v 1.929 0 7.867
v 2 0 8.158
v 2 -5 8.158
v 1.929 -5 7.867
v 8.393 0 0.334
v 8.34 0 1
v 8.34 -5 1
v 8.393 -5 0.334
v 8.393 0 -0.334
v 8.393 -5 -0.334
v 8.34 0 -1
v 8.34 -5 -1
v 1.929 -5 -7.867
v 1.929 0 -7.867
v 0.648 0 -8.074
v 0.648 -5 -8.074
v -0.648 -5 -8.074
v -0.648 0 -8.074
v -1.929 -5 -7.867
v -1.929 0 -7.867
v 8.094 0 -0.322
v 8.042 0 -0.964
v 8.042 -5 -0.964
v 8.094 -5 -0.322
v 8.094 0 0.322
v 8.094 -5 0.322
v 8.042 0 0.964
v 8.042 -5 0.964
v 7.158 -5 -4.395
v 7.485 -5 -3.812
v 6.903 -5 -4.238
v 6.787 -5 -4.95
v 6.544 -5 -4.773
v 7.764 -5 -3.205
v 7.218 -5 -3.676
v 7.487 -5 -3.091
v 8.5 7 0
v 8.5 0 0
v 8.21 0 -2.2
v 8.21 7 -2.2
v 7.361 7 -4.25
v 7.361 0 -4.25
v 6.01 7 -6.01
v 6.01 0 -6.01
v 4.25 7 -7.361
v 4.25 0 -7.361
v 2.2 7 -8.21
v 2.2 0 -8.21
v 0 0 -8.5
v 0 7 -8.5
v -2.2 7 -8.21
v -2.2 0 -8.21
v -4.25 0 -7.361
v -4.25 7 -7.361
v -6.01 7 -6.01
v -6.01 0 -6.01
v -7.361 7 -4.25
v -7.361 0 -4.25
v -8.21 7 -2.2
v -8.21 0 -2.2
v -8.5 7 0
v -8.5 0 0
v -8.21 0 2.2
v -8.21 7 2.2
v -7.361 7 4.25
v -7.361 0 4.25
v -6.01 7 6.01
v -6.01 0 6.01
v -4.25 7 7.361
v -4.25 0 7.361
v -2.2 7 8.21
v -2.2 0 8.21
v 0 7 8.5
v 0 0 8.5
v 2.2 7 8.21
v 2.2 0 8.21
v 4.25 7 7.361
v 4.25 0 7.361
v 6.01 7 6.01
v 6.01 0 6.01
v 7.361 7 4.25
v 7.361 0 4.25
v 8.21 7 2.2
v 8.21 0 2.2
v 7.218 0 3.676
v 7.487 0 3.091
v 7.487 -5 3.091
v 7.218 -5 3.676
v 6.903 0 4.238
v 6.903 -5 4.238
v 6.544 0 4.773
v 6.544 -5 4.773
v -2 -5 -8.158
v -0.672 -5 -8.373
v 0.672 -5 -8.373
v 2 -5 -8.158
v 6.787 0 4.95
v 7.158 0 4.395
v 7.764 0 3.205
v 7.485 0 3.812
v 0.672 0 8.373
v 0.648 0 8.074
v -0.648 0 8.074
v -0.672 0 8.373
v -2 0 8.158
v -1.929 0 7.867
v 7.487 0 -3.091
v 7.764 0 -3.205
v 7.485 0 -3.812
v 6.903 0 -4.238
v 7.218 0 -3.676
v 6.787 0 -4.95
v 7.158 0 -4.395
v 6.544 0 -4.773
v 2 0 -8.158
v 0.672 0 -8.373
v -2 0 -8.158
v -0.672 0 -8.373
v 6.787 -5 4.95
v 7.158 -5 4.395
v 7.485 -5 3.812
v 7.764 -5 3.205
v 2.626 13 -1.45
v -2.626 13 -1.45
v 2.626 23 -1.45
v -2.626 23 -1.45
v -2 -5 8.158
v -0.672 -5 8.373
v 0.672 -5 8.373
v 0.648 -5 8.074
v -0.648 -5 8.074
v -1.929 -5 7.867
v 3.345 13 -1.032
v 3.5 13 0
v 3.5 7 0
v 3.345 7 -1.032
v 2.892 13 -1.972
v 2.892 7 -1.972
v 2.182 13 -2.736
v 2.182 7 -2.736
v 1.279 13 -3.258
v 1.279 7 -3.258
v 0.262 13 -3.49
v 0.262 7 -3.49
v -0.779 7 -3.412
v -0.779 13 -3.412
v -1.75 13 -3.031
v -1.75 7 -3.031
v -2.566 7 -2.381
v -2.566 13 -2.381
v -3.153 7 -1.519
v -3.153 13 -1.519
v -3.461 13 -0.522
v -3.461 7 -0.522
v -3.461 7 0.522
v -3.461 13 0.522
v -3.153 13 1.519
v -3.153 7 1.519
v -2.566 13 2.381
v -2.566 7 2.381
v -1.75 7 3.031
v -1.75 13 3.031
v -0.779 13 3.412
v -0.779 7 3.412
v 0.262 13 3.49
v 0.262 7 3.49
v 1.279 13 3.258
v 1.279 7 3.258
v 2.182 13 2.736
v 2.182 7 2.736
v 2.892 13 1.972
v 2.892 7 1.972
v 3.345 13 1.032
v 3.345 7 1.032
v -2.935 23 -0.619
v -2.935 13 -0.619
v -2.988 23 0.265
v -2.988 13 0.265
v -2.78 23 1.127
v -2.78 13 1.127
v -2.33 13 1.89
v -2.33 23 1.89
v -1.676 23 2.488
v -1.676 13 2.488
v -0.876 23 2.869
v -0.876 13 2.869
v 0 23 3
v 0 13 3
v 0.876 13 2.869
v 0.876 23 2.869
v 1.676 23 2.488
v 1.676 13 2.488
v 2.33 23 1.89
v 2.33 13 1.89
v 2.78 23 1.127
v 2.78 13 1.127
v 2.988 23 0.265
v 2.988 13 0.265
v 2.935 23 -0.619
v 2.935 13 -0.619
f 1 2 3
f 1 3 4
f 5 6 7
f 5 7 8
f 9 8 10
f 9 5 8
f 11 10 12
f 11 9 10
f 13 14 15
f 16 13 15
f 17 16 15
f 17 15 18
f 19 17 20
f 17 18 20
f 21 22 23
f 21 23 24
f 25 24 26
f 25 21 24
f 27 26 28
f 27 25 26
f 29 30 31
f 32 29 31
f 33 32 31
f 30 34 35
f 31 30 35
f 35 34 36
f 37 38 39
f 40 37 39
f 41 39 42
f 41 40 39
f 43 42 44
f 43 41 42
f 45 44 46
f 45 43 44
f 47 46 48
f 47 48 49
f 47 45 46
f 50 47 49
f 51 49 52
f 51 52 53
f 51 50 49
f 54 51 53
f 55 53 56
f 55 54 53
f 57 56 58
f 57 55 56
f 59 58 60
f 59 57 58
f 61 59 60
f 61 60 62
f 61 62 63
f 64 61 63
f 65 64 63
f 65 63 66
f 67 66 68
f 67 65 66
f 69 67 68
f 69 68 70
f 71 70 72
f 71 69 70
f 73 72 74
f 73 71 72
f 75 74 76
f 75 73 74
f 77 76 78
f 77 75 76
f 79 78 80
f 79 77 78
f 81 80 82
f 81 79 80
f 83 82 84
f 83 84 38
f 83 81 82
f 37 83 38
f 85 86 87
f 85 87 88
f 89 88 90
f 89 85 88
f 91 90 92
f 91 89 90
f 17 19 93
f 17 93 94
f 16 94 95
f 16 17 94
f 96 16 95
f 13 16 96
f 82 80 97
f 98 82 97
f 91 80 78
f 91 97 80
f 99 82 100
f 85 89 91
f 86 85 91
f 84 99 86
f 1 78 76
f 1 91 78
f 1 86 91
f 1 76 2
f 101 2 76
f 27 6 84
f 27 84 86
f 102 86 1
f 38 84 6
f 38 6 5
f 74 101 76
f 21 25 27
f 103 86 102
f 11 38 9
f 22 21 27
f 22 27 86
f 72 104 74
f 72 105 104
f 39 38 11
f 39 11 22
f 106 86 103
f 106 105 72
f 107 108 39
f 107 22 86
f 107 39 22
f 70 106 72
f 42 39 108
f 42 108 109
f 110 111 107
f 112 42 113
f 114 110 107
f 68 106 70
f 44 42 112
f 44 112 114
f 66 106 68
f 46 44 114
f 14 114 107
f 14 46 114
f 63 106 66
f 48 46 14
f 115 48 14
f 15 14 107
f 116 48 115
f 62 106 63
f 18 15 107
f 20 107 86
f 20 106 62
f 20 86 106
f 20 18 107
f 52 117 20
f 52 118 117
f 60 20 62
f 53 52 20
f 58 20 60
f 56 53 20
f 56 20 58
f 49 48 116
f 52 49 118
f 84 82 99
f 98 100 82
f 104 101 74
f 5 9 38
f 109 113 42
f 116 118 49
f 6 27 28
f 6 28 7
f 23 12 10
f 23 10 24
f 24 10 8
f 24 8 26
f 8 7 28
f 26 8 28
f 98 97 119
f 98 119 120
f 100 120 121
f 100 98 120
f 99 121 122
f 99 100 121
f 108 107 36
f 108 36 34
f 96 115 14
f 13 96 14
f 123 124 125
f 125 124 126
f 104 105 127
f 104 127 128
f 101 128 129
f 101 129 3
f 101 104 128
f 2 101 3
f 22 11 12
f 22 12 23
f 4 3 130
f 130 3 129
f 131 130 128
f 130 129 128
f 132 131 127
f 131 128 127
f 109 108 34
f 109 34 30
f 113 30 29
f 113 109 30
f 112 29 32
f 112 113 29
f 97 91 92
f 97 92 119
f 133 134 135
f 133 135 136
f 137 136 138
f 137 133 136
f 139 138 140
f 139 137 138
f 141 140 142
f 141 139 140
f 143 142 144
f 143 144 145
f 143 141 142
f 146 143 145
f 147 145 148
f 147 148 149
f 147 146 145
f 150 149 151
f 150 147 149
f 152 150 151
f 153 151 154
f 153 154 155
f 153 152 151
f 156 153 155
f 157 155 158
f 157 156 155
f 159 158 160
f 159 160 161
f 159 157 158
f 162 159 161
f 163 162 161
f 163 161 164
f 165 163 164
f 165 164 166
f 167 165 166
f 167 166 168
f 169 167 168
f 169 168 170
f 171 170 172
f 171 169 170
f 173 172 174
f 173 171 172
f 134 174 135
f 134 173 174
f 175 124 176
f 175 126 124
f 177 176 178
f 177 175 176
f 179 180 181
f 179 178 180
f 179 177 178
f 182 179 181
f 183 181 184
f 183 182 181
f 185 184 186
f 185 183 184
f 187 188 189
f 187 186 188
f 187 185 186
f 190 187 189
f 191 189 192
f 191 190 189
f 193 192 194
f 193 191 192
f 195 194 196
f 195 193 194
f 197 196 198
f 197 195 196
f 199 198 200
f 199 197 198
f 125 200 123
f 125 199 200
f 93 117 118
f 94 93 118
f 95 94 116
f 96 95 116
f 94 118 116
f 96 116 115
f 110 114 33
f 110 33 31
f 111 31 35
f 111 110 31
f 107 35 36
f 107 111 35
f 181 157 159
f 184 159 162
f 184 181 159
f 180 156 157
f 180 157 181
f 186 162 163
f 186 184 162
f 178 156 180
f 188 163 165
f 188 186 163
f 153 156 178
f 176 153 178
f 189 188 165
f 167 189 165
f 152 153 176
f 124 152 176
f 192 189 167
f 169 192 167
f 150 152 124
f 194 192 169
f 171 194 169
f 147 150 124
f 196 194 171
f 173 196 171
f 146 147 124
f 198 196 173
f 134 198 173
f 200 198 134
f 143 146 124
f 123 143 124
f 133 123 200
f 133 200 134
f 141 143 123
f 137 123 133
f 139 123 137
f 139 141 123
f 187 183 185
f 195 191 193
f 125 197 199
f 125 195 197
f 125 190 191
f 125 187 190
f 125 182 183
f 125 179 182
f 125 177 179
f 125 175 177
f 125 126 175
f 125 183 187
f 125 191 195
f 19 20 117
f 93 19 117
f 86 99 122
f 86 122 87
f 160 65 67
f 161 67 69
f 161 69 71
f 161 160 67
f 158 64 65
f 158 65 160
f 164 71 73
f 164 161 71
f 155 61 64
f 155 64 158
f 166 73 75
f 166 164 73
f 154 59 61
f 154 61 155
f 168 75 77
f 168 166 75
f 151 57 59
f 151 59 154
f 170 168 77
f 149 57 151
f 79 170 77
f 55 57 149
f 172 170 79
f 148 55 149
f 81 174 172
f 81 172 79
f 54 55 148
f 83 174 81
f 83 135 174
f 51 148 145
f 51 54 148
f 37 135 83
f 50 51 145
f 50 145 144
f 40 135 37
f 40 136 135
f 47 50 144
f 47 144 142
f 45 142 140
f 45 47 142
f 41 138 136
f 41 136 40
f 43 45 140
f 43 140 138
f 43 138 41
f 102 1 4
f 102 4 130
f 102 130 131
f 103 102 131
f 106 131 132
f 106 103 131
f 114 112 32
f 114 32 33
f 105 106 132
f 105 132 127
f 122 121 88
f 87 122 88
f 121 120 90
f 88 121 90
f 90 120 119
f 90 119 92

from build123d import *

# Parameters (mm, degrees)
BOSS_EXTRUDE1_DEPTH     = 5
CUT_EXTRUDE1_DEPTH      = 26.951878545
CUT_EXTRUDE1_DEPTH_BACK = 26.951878545
SKETCH4_W               = 1.55
SKETCH4_H               = 10


with BuildPart() as part:
    # Sketch2 → Revolve1 (revolve)
    with BuildSketch(Plane.XY):
        Polygon((0, 0), (8.5, 0), (8.5, 7), (3.5, 7), (3.5, 13), (3, 13), (3, 23), (0, 23), align=None)
    revolve(axis=Axis((0, -1000, 0), (0, 1, 0)))

    # Sketch3 → Boss-Extrude1 (add)
    with BuildSketch(Plane.XZ):
        with BuildLine():
            Line((6.544190201, 4.773214286), (6.786567616, 4.95))
            ThreePointArc((6.786567616, 4.95), (7.327590965, 4.106873586), (7.76439466, 3.205335485))
            Line((7.76439466, 3.205335485), (7.48709485, 3.090859217))
            ThreePointArc((7.48709485, 3.090859217), (7.065891288, 3.960199529), (6.544190201, 4.773214286))
        make_face()
        with BuildLine():
            Line((8.042397221, 0.964285714), (8.340263785, 1))
            ThreePointArc((8.340263785, 1), (8.4, 0), (8.340263785, -1))
            Line((8.340263785, -1), (8.042397221, -0.964285714))
            ThreePointArc((8.042397221, -0.964285714), (8.1, 0), (8.042397221, 0.964285714))
        make_face()
        with BuildLine():
            Line((7.48709485, -3.090859217), (7.76439466, -3.205335485))
            ThreePointArc((7.76439466, -3.205335485), (7.327590965, -4.106873586), (6.786567616, -4.95))
            Line((6.786567616, -4.95), (6.544190201, -4.773214286))
            ThreePointArc((6.544190201, -4.773214286), (7.065891288, -3.960199529), (7.48709485, -3.090859217))
        make_face()
        with BuildLine():
            Line((-1.928571429, -7.867058678), (-2, -8.158431222))
            ThreePointArc((-2, -8.158431222), (0, -8.4), (2, -8.158431222))
            Line((2, -8.158431222), (1.928571429, -7.867058678))
            ThreePointArc((1.928571429, -7.867058678), (0, -8.1), (-1.928571429, -7.867058678))
        make_face()
        with BuildLine():
            Line((-1.928571429, 7.867058678), (-2, 8.158431222))
            ThreePointArc((-2, 8.158431222), (0, 8.4), (2, 8.158431222))
            Line((2, 8.158431222), (1.928571429, 7.867058678))
            ThreePointArc((1.928571429, 7.867058678), (0, 8.1), (-1.928571429, 7.867058678))
        make_face()
    extrude(amount=BOSS_EXTRUDE1_DEPTH)

    # Sketch4 → Cut-Extrude1 (cut, two sides: drawn at the far end of the back side and taken through both)
    with BuildSketch(Plane(origin=(0, 0, 0), x_dir=(0, 0, -1), z_dir=(1, 0, 0)).offset(-CUT_EXTRUDE1_DEPTH_BACK)):
        with Locations((2.225, 18)):
            Rectangle(SKETCH4_W, SKETCH4_H)
    extrude(amount=CUT_EXTRUDE1_DEPTH + CUT_EXTRUDE1_DEPTH_BACK, mode=Mode.SUBTRACT)


solid = part.part
